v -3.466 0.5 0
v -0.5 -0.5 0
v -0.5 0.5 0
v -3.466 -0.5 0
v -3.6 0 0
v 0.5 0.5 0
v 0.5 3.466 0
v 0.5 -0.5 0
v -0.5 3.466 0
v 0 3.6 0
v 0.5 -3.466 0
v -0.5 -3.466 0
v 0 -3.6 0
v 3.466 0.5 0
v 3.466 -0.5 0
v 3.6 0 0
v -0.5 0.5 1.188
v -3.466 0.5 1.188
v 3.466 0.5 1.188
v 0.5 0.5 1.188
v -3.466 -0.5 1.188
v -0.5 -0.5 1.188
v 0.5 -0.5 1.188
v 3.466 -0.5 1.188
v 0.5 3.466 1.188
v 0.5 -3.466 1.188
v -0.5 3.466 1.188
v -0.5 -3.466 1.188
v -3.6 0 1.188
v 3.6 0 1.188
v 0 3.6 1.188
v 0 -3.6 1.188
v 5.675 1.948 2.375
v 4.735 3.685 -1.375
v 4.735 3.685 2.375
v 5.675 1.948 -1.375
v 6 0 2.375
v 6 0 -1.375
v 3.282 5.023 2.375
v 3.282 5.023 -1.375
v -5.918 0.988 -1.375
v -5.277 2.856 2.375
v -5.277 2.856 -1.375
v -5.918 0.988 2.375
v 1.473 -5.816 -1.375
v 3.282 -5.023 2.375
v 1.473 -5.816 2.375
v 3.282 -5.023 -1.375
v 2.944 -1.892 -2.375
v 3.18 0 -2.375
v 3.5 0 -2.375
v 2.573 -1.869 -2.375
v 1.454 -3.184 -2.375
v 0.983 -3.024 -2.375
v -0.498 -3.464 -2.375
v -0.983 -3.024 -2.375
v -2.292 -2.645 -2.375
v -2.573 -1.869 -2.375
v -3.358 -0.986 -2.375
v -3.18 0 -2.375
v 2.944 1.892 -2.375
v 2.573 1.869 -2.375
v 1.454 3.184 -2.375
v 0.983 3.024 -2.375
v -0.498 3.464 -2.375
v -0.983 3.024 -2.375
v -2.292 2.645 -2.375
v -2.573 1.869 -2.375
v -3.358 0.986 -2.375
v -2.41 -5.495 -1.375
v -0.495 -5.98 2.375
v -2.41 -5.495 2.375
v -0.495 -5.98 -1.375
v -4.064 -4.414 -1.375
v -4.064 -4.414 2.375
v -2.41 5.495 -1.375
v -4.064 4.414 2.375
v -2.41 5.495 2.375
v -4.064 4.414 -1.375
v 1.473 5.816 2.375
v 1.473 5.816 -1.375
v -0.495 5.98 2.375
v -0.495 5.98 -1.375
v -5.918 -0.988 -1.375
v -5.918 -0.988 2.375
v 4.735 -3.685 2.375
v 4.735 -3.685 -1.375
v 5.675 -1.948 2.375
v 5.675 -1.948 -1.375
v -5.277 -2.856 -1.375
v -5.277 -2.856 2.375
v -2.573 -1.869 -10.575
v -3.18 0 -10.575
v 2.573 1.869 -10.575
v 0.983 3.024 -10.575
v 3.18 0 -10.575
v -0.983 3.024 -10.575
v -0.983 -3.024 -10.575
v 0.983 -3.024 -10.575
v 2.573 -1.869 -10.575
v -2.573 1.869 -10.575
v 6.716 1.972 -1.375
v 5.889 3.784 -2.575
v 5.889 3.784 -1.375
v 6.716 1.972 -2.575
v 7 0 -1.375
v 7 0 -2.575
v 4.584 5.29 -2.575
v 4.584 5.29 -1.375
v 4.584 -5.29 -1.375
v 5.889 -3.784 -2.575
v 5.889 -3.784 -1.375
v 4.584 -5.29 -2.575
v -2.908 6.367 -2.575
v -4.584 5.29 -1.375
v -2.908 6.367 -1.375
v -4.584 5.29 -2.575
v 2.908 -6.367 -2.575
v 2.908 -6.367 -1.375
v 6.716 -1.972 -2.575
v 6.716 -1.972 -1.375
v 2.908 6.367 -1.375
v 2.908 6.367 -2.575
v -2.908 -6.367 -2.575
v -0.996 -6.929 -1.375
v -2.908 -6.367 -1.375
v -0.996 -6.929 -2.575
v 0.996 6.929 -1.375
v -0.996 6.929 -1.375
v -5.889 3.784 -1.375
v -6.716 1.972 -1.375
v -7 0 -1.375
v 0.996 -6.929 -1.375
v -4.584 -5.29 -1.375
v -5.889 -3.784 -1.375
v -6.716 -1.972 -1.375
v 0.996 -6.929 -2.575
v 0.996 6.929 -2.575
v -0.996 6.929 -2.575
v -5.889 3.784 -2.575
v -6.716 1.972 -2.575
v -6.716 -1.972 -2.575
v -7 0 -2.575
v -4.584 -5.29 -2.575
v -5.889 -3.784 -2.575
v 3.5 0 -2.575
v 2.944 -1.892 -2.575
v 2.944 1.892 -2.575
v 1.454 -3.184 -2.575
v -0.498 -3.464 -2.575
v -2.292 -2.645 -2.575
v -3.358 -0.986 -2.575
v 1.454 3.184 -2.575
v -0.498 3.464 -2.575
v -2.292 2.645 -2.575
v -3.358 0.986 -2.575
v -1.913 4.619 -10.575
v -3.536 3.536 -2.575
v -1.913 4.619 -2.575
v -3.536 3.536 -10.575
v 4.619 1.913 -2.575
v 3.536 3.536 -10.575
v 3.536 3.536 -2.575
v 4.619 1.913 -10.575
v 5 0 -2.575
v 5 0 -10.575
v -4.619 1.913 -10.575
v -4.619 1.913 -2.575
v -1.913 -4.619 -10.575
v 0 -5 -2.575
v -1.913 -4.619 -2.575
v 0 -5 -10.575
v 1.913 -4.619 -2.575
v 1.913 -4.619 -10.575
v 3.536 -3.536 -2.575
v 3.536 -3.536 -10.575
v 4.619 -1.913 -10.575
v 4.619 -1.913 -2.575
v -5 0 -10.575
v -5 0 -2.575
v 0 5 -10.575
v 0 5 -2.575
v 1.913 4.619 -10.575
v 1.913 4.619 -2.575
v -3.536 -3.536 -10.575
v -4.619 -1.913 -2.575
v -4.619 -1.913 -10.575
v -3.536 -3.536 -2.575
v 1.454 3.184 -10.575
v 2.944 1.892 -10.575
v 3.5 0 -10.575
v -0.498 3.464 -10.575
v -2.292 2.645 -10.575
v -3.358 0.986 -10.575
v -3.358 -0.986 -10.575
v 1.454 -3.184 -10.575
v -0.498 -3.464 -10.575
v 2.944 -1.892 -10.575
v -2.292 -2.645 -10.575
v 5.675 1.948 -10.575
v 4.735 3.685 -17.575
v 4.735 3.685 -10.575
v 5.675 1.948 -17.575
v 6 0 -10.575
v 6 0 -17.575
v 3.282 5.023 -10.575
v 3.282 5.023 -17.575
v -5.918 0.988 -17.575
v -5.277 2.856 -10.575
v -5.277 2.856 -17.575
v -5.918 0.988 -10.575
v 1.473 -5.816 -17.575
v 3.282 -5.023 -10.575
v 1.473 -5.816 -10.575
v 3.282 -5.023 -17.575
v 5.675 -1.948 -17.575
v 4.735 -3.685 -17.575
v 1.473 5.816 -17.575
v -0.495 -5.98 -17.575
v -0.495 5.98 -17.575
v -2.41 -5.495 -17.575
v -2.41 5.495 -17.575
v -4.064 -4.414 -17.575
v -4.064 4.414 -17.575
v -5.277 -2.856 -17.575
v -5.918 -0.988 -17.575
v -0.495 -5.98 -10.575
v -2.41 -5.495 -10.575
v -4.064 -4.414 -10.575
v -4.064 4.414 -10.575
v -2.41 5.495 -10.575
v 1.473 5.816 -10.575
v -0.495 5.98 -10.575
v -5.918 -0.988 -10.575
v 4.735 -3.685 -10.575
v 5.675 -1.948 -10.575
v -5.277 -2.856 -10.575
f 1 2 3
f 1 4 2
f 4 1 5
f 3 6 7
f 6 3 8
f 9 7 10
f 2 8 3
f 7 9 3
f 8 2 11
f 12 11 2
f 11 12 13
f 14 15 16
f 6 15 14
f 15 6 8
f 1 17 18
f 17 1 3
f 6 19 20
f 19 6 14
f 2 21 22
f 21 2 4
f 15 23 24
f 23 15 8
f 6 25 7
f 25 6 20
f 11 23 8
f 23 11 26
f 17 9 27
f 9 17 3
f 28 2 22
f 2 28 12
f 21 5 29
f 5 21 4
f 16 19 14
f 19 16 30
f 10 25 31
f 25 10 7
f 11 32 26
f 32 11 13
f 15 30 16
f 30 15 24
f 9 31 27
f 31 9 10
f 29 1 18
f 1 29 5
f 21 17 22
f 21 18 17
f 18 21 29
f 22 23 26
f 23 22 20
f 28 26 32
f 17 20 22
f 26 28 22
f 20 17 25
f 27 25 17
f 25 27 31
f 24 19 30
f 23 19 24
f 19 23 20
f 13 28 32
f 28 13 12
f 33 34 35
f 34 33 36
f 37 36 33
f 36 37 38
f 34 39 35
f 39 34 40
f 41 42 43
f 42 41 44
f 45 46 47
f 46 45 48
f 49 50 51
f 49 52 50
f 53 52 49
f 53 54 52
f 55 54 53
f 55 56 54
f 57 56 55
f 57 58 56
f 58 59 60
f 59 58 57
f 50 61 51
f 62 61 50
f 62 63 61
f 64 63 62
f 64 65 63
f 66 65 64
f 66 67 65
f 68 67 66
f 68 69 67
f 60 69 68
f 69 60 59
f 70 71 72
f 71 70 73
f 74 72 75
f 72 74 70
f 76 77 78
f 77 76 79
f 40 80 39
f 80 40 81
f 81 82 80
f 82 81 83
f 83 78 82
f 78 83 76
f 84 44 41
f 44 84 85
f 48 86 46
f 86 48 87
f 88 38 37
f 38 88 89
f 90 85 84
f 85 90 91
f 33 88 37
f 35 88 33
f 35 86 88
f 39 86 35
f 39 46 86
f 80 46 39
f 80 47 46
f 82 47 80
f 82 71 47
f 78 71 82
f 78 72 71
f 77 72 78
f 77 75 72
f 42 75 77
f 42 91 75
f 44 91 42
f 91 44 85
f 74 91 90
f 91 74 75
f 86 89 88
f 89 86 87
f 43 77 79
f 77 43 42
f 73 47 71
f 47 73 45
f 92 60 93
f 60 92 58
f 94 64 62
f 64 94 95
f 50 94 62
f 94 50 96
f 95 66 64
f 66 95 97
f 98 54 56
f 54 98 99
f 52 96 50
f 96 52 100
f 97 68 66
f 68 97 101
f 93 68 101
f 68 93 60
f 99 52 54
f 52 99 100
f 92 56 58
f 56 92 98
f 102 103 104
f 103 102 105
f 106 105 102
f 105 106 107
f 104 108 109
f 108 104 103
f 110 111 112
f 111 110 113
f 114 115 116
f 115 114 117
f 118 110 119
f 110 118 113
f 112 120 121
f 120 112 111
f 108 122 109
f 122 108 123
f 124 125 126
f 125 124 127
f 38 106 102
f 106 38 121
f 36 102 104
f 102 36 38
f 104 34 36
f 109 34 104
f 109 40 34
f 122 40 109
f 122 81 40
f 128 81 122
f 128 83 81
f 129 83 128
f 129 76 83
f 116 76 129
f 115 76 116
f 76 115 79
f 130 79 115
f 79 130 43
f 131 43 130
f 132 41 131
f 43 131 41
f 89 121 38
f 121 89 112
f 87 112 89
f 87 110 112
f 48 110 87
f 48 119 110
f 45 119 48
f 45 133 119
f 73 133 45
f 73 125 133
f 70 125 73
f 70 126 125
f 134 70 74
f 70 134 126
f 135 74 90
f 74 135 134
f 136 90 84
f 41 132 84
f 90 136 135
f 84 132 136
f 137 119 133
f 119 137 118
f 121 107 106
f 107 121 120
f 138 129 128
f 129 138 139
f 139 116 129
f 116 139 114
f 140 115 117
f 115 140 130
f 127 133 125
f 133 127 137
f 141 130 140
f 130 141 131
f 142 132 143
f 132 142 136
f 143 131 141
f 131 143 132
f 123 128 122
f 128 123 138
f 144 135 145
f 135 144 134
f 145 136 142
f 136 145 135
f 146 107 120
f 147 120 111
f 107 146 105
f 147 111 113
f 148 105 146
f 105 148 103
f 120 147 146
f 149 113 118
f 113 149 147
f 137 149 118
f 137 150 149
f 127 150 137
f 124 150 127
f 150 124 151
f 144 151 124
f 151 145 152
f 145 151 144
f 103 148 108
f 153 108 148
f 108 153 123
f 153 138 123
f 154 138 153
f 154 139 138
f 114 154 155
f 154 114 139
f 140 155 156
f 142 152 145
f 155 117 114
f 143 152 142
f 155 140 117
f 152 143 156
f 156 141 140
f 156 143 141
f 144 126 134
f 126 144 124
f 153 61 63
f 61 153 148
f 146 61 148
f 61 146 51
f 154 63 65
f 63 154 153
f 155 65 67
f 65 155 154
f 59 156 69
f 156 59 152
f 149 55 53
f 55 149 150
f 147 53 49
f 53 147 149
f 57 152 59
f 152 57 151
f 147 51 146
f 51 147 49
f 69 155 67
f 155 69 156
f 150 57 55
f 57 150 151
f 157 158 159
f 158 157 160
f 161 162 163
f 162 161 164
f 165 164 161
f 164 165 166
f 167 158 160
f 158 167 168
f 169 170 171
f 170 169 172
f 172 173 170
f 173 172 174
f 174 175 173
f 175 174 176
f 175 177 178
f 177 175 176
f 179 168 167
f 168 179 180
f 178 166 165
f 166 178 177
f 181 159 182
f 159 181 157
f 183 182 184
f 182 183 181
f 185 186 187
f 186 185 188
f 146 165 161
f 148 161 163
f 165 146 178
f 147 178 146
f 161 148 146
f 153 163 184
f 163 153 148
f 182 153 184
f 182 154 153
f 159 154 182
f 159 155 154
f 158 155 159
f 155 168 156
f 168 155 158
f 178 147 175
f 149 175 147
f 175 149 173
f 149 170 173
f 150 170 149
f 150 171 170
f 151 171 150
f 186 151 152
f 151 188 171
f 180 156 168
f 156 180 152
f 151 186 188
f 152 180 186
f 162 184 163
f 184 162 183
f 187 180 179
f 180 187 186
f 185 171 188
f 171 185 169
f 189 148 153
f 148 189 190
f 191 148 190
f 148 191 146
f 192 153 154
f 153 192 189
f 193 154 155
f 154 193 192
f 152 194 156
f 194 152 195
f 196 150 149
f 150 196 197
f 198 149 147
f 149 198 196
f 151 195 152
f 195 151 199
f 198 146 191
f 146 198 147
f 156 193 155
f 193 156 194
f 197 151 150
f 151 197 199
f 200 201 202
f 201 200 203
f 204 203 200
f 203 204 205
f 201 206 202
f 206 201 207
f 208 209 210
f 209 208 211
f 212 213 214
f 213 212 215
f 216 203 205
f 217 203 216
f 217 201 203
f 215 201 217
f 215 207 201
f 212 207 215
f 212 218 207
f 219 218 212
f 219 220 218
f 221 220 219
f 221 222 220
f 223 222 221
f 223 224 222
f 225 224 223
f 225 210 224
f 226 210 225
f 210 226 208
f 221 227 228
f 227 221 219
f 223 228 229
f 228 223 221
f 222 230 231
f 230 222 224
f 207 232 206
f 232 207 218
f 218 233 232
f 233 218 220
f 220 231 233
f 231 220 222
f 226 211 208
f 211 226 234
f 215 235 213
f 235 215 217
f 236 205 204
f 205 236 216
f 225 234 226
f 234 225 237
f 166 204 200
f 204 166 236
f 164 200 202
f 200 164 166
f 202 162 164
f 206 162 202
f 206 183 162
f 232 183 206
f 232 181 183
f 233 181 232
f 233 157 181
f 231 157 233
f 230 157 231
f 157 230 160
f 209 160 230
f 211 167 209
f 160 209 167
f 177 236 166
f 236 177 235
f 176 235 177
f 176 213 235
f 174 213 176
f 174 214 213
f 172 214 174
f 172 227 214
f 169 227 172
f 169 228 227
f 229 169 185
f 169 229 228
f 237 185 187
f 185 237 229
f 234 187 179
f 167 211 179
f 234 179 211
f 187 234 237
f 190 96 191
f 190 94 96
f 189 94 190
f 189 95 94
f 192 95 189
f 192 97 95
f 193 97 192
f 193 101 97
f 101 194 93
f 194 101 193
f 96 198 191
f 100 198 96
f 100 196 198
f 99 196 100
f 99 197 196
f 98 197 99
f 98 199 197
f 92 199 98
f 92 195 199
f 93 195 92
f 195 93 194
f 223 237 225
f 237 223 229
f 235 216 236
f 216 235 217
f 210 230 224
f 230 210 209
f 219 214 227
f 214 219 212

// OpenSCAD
// Parameters
shaft_diameter_mm = 6.0; //[3.0:12.0:0.1]
length_under_head_mm = 10.0; //[5.0:20.0:0.1]
head_diameter_mm = 12.0; //[6.0:24.0:0.1]
head_height_mm = 4.75; //[2.375:9.5:0.05]
drive_socket_radius_factor = 0.6; //[0.4:0.8:0.01]
drive_socket_depth_factor = 0.5; //[0.2:0.8:0.01]
drive_slot_width_mm = 1.0; //[0.5:2.5:0.1]
thread_major_diameter_factor = 1.06; //[1.0:1.15:0.01]
thread_pitch_mm = 1.0; //[0.5:2.0:0.1]
thread_depth_mm = 0.35; //[0.15:0.8:0.05]
thread_start_offset_mm = 0.5; //[0.0:2.0:0.1]
overlap_mm = 1.0; //[0.5:2.0:0.1]
washer_outer_diameter_mm = 14.0; //[10.0:28.0:0.1]
washer_thickness_mm = 1.2; //[0.6:3.0:0.1]
spacer_height_mm = 8.0; //[4.0:16.0:0.1]
spacer_outer_diameter_mm = 10.0; //[7.0:20.0:0.1]
buzzer_diameter_mm = 12.0; //[8.0:24.0:0.1]
buzzer_height_mm = 7.0; //[4.0:14.0:0.1]

// Screw and Washer - complete geometry
module screw_and_washer() {
  color("DimGray") {
    // Screw Shaft
    translate([0, 0, -head_height_mm/2 - length_under_head_mm/2 + overlap_mm])
      cylinder(h=length_under_head_mm, r=shaft_diameter_mm/2, center=true);

    // Pan Head
    translate([0, 0, 0])
      difference() {
        cylinder(h=head_height_mm, r=head_diameter_mm/2, center=true);
        // Drive Recess
        intersection() {
          cylinder(h=head_height_mm*drive_socket_depth_factor, r=(head_diameter_mm/2)*drive_socket_radius_factor, center=true);
          union() {
            translate([0, 0, head_height_mm/2 - (head_height_mm*drive_socket_depth_factor)/2])
              cube([(head_diameter_mm/2)*drive_socket_radius_factor*2, drive_slot_width_mm, head_height_mm*drive_socket_depth_factor], center=true);
            translate([0, 0, head_height_mm/2 - (head_height_mm*drive_socket_depth_factor)/2])
              cube([drive_slot_width_mm, (head_diameter_mm/2)*drive_socket_radius_factor*2, head_height_mm*drive_socket_depth_factor], center=true);
          }
        }
      }

    // Thread Representation
    translate([0, 0, -head_height_mm/2 - (length_under_head_mm - thread_start_offset_mm)/2 + overlap_mm - thread_start_offset_mm/2])
      difference() {
        cylinder(h=length_under_head_mm - thread_start_offset_mm, r=(shaft_diameter_mm/2)*thread_major_diameter_factor, center=true);
        cylinder(h=length_under_head_mm - thread_start_offset_mm + overlap_mm*2, r=(shaft_diameter_mm/2)*thread_major_diameter_factor - thread_depth_mm, center=true);
      }

    // Washer
    translate([0, 0, -head_height_mm/2 - washer_thickness_mm/2 + overlap_mm])
      difference() {
        cylinder(h=washer_thickness_mm, r=washer_outer_diameter_mm/2, center=true);
        cylinder(h=washer_thickness_mm + overlap_mm*2, r=shaft_diameter_mm/2 + overlap_mm/2, center=true);
      }
  }
}

// PCB Spacer - complete geometry
module pcb_spacer() {
  color("Silver") {
    translate([0, 0, -head_height_mm/2 - washer_thickness_mm - spacer_height_mm/2 + overlap_mm])
      difference() {
        cylinder(h=spacer_height_mm, r=spacer_outer_diameter_mm/2, center=true);
        cylinder(h=spacer_height_mm + overlap_mm*2, r=shaft_diameter_mm/2 + overlap_mm/2, center=true);
      }
  }
}

// Buzzer - complete geometry
module buzzer() {
  color("Black") {
    translate([0, 0, -head_height_mm/2 - washer_thickness_mm - spacer_height_mm - buzzer_height_mm/2 + overlap_mm])
      cylinder(h=buzzer_height_mm, r=buzzer_diameter_mm/2, center=true);
  }
}

// Assembly
module assembly() {
  screw_and_washer();
  pcb_spacer();
  buzzer();
}

assembly();
